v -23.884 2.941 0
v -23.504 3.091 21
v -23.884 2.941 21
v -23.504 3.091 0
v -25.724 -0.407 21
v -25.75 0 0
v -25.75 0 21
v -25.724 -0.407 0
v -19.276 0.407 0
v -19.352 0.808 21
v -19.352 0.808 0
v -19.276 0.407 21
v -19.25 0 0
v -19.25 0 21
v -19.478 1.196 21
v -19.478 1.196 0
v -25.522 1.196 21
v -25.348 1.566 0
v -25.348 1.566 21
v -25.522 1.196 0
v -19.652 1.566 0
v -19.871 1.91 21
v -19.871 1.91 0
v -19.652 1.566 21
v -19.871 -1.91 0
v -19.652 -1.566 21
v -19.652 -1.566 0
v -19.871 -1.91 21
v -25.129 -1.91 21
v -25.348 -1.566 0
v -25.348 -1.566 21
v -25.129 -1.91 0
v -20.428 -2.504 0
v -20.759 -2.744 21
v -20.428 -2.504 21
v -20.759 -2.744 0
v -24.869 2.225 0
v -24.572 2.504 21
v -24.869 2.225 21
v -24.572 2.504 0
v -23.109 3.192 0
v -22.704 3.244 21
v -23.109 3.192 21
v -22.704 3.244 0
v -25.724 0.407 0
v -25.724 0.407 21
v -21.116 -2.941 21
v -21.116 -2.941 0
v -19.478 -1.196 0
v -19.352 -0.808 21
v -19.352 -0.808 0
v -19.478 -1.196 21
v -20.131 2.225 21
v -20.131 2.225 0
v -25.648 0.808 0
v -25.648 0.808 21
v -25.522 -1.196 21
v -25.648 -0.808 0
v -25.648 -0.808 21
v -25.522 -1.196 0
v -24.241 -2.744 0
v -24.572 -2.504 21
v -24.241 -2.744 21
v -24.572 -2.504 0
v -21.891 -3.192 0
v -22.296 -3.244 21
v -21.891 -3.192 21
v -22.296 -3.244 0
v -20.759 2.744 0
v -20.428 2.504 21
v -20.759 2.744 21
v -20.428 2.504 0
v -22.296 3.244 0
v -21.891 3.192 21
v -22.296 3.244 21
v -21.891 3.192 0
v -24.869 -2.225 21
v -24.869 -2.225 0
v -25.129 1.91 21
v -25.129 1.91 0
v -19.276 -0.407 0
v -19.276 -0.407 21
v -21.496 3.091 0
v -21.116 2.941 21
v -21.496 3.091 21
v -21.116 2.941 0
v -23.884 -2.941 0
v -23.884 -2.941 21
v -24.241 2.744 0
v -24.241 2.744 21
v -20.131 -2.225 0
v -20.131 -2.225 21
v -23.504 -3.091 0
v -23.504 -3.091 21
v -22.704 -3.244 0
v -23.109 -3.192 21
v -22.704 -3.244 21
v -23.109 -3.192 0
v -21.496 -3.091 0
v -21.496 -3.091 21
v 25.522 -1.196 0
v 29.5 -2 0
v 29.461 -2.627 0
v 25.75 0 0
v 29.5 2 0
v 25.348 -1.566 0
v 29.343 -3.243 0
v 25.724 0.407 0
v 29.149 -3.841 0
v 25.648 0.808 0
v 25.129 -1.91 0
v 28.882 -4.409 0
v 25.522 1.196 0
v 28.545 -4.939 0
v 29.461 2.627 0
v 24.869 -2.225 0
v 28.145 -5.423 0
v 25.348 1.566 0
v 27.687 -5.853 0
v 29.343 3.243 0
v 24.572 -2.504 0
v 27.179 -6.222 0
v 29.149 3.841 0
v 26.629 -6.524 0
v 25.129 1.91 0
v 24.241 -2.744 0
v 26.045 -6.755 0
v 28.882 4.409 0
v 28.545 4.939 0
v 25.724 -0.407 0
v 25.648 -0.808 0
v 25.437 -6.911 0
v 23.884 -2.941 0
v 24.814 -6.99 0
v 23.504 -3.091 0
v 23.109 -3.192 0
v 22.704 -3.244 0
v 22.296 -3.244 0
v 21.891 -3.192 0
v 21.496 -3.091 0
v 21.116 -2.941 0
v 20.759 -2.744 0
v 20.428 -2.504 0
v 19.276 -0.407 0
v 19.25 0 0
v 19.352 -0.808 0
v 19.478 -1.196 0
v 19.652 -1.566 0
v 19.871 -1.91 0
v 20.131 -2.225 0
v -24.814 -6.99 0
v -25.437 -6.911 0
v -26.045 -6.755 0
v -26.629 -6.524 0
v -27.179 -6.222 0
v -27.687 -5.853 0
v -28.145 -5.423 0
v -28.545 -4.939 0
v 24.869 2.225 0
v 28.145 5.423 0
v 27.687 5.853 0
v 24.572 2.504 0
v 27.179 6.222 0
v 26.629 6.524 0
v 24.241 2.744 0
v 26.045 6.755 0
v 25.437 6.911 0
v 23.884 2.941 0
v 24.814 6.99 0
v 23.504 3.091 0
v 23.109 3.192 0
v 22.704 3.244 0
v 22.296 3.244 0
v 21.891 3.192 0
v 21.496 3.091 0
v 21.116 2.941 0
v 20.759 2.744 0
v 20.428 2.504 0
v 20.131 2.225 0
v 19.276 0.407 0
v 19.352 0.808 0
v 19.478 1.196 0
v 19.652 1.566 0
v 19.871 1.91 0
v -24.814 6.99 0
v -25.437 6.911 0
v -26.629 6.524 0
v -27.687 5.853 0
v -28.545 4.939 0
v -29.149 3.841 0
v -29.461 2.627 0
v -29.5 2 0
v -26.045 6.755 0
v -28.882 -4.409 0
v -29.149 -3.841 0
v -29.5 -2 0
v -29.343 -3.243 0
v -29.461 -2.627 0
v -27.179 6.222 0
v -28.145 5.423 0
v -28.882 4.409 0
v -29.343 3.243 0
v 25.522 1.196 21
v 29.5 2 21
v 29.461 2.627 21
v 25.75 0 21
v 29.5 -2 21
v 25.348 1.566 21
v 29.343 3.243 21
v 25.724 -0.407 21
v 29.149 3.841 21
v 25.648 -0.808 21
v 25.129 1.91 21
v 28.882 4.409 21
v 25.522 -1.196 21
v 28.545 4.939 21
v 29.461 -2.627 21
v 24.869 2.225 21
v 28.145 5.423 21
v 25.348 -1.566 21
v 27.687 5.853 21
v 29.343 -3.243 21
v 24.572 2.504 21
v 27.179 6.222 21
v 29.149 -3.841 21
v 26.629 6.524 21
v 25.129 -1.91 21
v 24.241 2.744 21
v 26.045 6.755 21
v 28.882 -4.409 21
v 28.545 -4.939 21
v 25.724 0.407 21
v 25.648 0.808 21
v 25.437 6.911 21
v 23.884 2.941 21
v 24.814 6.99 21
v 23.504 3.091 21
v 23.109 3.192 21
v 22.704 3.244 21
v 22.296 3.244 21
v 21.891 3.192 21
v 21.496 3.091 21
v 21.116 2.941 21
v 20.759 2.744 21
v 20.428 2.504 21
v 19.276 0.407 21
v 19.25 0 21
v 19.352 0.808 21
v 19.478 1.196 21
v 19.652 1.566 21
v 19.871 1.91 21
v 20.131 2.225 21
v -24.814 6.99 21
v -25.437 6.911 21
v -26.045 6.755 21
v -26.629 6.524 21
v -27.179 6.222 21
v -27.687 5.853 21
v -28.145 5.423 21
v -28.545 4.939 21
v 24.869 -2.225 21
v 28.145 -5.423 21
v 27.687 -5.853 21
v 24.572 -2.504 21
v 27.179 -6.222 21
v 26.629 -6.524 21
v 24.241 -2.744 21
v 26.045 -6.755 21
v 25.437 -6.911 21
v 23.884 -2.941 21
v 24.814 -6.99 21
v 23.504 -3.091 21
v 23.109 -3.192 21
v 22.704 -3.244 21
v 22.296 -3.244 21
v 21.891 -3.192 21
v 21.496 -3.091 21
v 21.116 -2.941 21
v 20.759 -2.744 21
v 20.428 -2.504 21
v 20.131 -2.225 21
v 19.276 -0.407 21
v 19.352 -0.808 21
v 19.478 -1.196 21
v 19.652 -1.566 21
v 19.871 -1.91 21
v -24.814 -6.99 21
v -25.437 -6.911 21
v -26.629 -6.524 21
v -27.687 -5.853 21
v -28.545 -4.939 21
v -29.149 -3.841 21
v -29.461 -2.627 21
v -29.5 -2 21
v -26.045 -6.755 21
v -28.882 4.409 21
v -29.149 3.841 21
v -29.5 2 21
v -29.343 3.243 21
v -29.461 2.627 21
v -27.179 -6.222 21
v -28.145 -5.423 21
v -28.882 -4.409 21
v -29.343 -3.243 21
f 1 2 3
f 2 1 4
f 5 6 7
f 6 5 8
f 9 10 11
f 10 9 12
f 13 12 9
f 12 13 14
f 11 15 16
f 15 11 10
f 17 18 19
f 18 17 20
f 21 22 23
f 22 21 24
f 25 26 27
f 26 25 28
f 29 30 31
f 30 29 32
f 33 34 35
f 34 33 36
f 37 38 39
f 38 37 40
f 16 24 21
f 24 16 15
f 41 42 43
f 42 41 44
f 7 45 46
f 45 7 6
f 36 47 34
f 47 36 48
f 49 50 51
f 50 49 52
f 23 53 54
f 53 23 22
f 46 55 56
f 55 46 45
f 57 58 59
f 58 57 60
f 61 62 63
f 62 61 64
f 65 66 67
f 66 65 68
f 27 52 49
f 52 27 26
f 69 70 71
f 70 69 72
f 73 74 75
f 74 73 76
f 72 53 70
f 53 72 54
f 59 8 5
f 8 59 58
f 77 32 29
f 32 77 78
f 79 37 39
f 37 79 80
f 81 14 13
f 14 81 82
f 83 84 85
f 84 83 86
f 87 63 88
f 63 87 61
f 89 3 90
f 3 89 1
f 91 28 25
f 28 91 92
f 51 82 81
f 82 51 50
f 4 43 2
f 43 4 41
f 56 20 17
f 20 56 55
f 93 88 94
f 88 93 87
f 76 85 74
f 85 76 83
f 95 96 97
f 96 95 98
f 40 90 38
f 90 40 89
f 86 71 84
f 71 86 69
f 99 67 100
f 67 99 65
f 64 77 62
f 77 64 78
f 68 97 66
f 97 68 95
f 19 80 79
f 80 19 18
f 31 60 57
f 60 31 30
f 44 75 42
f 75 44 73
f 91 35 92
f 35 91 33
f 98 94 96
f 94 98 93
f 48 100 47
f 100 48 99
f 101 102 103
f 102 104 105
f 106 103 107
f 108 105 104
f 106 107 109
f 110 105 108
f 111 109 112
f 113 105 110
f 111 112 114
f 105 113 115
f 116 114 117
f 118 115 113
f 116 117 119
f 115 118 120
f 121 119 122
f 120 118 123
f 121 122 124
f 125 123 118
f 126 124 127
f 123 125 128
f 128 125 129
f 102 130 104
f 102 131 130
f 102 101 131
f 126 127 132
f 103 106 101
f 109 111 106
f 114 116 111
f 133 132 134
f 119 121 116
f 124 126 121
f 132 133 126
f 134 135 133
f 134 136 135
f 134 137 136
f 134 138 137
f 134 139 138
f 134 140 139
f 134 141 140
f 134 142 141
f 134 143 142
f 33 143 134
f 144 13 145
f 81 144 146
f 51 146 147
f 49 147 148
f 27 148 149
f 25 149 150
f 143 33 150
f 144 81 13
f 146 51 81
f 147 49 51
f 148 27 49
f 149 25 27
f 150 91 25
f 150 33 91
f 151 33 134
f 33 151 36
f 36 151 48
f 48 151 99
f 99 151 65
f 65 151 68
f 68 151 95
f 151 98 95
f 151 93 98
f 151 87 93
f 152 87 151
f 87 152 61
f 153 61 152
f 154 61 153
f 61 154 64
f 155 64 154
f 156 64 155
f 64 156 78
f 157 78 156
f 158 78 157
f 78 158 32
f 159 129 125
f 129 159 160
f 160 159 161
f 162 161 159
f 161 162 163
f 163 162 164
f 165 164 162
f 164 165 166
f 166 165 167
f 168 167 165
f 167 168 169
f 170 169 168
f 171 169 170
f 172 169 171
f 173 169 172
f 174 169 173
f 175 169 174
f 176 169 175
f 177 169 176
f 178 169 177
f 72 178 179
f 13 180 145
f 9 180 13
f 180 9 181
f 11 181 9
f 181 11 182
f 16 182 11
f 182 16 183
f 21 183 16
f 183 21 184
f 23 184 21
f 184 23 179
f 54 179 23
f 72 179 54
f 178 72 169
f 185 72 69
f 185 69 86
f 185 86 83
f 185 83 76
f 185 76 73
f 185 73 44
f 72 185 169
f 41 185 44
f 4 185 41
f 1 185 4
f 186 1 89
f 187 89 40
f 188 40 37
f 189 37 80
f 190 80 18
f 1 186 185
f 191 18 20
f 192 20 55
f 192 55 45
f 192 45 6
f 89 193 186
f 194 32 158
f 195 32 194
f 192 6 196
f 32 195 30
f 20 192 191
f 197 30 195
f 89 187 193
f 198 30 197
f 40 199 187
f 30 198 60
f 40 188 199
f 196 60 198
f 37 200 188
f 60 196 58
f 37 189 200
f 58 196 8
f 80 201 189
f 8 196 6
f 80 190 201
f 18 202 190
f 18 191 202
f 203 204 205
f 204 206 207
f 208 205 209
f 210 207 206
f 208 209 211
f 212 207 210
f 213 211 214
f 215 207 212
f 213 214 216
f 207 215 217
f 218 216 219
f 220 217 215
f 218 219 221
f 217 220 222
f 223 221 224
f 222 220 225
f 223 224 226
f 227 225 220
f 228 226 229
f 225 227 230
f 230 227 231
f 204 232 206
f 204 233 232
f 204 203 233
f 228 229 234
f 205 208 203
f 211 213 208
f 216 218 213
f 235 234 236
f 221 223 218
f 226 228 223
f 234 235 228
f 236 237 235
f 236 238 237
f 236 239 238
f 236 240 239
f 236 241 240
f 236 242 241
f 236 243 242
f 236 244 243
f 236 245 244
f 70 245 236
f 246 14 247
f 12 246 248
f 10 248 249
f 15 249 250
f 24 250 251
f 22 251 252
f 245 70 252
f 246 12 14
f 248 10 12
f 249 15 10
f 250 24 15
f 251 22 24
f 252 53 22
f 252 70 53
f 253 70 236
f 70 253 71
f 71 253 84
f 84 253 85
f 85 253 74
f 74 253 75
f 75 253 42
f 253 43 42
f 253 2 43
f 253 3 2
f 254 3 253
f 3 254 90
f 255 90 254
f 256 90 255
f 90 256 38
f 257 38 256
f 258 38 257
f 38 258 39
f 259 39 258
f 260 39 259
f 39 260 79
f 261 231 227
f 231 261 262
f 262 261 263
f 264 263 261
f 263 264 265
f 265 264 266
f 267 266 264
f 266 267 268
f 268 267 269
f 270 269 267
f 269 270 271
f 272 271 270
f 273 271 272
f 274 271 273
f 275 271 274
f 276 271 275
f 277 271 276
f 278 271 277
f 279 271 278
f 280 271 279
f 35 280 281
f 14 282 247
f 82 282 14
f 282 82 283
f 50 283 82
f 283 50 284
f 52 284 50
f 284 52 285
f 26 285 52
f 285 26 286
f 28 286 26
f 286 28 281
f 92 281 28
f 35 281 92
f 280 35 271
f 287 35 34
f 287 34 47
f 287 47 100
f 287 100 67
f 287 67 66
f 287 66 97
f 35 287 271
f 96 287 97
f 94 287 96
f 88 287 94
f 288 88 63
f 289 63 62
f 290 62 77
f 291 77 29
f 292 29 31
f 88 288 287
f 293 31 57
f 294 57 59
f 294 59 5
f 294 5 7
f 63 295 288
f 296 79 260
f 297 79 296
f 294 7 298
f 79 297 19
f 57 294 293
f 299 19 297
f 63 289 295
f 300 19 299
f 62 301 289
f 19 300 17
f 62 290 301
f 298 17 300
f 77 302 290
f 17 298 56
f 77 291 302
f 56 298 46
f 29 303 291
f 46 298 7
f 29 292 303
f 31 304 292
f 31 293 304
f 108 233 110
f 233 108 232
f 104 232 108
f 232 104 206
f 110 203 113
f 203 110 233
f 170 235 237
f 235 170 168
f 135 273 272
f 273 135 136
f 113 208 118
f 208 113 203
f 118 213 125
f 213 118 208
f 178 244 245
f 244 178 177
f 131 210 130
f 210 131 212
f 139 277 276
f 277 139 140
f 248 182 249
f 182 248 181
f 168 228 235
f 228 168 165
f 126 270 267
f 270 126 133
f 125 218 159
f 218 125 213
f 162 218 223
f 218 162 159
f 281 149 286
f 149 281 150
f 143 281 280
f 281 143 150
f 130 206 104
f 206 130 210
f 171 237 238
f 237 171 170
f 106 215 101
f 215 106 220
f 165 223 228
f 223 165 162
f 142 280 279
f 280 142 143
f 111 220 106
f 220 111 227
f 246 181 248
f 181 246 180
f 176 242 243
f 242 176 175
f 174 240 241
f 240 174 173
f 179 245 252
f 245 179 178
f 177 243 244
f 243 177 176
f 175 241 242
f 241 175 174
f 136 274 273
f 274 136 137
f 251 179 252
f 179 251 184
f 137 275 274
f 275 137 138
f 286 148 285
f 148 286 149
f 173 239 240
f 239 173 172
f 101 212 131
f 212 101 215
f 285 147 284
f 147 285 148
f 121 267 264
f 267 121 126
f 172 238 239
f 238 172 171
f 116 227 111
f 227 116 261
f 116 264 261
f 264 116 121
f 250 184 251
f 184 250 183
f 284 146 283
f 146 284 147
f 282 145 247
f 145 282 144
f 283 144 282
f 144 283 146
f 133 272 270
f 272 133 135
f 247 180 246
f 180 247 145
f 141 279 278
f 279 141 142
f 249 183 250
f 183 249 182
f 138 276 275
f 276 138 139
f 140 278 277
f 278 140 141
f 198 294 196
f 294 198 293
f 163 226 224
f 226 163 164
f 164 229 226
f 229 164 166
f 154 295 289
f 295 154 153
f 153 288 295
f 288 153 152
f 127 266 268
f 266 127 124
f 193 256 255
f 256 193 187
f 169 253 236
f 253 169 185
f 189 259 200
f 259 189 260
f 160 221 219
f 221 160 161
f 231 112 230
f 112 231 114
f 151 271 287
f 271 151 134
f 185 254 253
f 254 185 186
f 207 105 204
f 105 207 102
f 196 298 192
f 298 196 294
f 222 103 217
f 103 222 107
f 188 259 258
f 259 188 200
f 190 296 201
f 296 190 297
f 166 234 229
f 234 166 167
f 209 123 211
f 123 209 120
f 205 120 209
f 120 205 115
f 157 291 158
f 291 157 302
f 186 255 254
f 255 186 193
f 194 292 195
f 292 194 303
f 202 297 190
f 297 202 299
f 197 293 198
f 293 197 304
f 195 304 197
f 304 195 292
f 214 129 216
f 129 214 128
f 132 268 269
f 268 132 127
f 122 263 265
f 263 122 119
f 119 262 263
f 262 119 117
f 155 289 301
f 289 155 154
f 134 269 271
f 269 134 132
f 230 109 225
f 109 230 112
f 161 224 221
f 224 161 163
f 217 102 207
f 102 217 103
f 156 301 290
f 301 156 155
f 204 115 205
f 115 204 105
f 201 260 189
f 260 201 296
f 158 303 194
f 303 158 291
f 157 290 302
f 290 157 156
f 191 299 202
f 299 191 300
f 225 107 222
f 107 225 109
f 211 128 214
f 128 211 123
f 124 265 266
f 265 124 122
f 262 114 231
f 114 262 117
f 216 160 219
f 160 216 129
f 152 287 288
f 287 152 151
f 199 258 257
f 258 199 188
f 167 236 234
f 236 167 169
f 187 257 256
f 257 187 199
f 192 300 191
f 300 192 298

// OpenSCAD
$fn = 50;


difference() {
	union() {
		hull() {
			translate(v = [-24.5000000000, 2.0000000000, 0]) {
				cylinder(h = 21, r = 5);
			}
			translate(v = [24.5000000000, 2.0000000000, 0]) {
				cylinder(h = 21, r = 5);
			}
			translate(v = [-24.5000000000, -2.0000000000, 0]) {
				cylinder(h = 21, r = 5);
			}
			translate(v = [24.5000000000, -2.0000000000, 0]) {
				cylinder(h = 21, r = 5);
			}
		}
	}
	union() {
		translate(v = [-22.5000000000, 0.0000000000, 0]) {
			cylinder(h = 21, r = 3.2500000000);
		}
		translate(v = [22.5000000000, 0.0000000000, 0]) {
			cylinder(h = 21, r = 3.2500000000);
		}
		translate(v = [-22.5000000000, 0.0000000000, 0]) {
			cylinder(h = 21, r = 1.8000000000);
		}
		translate(v = [22.5000000000, 0.0000000000, 0]) {
			cylinder(h = 21, r = 1.8000000000);
		}
		translate(v = [-22.5000000000, 0.0000000000, 0]) {
			cylinder(h = 21, r = 1.8000000000);
		}
		translate(v = [22.5000000000, 0.0000000000, 0]) {
			cylinder(h = 21, r = 1.8000000000);
		}
		translate(v = [-22.5000000000, 0.0000000000, 0]) {
			cylinder(h = 21, r = 1.8000000000);
		}
		translate(v = [22.5000000000, 0.0000000000, 0]) {
			cylinder(h = 21, r = 1.8000000000);
		}
	}
}
